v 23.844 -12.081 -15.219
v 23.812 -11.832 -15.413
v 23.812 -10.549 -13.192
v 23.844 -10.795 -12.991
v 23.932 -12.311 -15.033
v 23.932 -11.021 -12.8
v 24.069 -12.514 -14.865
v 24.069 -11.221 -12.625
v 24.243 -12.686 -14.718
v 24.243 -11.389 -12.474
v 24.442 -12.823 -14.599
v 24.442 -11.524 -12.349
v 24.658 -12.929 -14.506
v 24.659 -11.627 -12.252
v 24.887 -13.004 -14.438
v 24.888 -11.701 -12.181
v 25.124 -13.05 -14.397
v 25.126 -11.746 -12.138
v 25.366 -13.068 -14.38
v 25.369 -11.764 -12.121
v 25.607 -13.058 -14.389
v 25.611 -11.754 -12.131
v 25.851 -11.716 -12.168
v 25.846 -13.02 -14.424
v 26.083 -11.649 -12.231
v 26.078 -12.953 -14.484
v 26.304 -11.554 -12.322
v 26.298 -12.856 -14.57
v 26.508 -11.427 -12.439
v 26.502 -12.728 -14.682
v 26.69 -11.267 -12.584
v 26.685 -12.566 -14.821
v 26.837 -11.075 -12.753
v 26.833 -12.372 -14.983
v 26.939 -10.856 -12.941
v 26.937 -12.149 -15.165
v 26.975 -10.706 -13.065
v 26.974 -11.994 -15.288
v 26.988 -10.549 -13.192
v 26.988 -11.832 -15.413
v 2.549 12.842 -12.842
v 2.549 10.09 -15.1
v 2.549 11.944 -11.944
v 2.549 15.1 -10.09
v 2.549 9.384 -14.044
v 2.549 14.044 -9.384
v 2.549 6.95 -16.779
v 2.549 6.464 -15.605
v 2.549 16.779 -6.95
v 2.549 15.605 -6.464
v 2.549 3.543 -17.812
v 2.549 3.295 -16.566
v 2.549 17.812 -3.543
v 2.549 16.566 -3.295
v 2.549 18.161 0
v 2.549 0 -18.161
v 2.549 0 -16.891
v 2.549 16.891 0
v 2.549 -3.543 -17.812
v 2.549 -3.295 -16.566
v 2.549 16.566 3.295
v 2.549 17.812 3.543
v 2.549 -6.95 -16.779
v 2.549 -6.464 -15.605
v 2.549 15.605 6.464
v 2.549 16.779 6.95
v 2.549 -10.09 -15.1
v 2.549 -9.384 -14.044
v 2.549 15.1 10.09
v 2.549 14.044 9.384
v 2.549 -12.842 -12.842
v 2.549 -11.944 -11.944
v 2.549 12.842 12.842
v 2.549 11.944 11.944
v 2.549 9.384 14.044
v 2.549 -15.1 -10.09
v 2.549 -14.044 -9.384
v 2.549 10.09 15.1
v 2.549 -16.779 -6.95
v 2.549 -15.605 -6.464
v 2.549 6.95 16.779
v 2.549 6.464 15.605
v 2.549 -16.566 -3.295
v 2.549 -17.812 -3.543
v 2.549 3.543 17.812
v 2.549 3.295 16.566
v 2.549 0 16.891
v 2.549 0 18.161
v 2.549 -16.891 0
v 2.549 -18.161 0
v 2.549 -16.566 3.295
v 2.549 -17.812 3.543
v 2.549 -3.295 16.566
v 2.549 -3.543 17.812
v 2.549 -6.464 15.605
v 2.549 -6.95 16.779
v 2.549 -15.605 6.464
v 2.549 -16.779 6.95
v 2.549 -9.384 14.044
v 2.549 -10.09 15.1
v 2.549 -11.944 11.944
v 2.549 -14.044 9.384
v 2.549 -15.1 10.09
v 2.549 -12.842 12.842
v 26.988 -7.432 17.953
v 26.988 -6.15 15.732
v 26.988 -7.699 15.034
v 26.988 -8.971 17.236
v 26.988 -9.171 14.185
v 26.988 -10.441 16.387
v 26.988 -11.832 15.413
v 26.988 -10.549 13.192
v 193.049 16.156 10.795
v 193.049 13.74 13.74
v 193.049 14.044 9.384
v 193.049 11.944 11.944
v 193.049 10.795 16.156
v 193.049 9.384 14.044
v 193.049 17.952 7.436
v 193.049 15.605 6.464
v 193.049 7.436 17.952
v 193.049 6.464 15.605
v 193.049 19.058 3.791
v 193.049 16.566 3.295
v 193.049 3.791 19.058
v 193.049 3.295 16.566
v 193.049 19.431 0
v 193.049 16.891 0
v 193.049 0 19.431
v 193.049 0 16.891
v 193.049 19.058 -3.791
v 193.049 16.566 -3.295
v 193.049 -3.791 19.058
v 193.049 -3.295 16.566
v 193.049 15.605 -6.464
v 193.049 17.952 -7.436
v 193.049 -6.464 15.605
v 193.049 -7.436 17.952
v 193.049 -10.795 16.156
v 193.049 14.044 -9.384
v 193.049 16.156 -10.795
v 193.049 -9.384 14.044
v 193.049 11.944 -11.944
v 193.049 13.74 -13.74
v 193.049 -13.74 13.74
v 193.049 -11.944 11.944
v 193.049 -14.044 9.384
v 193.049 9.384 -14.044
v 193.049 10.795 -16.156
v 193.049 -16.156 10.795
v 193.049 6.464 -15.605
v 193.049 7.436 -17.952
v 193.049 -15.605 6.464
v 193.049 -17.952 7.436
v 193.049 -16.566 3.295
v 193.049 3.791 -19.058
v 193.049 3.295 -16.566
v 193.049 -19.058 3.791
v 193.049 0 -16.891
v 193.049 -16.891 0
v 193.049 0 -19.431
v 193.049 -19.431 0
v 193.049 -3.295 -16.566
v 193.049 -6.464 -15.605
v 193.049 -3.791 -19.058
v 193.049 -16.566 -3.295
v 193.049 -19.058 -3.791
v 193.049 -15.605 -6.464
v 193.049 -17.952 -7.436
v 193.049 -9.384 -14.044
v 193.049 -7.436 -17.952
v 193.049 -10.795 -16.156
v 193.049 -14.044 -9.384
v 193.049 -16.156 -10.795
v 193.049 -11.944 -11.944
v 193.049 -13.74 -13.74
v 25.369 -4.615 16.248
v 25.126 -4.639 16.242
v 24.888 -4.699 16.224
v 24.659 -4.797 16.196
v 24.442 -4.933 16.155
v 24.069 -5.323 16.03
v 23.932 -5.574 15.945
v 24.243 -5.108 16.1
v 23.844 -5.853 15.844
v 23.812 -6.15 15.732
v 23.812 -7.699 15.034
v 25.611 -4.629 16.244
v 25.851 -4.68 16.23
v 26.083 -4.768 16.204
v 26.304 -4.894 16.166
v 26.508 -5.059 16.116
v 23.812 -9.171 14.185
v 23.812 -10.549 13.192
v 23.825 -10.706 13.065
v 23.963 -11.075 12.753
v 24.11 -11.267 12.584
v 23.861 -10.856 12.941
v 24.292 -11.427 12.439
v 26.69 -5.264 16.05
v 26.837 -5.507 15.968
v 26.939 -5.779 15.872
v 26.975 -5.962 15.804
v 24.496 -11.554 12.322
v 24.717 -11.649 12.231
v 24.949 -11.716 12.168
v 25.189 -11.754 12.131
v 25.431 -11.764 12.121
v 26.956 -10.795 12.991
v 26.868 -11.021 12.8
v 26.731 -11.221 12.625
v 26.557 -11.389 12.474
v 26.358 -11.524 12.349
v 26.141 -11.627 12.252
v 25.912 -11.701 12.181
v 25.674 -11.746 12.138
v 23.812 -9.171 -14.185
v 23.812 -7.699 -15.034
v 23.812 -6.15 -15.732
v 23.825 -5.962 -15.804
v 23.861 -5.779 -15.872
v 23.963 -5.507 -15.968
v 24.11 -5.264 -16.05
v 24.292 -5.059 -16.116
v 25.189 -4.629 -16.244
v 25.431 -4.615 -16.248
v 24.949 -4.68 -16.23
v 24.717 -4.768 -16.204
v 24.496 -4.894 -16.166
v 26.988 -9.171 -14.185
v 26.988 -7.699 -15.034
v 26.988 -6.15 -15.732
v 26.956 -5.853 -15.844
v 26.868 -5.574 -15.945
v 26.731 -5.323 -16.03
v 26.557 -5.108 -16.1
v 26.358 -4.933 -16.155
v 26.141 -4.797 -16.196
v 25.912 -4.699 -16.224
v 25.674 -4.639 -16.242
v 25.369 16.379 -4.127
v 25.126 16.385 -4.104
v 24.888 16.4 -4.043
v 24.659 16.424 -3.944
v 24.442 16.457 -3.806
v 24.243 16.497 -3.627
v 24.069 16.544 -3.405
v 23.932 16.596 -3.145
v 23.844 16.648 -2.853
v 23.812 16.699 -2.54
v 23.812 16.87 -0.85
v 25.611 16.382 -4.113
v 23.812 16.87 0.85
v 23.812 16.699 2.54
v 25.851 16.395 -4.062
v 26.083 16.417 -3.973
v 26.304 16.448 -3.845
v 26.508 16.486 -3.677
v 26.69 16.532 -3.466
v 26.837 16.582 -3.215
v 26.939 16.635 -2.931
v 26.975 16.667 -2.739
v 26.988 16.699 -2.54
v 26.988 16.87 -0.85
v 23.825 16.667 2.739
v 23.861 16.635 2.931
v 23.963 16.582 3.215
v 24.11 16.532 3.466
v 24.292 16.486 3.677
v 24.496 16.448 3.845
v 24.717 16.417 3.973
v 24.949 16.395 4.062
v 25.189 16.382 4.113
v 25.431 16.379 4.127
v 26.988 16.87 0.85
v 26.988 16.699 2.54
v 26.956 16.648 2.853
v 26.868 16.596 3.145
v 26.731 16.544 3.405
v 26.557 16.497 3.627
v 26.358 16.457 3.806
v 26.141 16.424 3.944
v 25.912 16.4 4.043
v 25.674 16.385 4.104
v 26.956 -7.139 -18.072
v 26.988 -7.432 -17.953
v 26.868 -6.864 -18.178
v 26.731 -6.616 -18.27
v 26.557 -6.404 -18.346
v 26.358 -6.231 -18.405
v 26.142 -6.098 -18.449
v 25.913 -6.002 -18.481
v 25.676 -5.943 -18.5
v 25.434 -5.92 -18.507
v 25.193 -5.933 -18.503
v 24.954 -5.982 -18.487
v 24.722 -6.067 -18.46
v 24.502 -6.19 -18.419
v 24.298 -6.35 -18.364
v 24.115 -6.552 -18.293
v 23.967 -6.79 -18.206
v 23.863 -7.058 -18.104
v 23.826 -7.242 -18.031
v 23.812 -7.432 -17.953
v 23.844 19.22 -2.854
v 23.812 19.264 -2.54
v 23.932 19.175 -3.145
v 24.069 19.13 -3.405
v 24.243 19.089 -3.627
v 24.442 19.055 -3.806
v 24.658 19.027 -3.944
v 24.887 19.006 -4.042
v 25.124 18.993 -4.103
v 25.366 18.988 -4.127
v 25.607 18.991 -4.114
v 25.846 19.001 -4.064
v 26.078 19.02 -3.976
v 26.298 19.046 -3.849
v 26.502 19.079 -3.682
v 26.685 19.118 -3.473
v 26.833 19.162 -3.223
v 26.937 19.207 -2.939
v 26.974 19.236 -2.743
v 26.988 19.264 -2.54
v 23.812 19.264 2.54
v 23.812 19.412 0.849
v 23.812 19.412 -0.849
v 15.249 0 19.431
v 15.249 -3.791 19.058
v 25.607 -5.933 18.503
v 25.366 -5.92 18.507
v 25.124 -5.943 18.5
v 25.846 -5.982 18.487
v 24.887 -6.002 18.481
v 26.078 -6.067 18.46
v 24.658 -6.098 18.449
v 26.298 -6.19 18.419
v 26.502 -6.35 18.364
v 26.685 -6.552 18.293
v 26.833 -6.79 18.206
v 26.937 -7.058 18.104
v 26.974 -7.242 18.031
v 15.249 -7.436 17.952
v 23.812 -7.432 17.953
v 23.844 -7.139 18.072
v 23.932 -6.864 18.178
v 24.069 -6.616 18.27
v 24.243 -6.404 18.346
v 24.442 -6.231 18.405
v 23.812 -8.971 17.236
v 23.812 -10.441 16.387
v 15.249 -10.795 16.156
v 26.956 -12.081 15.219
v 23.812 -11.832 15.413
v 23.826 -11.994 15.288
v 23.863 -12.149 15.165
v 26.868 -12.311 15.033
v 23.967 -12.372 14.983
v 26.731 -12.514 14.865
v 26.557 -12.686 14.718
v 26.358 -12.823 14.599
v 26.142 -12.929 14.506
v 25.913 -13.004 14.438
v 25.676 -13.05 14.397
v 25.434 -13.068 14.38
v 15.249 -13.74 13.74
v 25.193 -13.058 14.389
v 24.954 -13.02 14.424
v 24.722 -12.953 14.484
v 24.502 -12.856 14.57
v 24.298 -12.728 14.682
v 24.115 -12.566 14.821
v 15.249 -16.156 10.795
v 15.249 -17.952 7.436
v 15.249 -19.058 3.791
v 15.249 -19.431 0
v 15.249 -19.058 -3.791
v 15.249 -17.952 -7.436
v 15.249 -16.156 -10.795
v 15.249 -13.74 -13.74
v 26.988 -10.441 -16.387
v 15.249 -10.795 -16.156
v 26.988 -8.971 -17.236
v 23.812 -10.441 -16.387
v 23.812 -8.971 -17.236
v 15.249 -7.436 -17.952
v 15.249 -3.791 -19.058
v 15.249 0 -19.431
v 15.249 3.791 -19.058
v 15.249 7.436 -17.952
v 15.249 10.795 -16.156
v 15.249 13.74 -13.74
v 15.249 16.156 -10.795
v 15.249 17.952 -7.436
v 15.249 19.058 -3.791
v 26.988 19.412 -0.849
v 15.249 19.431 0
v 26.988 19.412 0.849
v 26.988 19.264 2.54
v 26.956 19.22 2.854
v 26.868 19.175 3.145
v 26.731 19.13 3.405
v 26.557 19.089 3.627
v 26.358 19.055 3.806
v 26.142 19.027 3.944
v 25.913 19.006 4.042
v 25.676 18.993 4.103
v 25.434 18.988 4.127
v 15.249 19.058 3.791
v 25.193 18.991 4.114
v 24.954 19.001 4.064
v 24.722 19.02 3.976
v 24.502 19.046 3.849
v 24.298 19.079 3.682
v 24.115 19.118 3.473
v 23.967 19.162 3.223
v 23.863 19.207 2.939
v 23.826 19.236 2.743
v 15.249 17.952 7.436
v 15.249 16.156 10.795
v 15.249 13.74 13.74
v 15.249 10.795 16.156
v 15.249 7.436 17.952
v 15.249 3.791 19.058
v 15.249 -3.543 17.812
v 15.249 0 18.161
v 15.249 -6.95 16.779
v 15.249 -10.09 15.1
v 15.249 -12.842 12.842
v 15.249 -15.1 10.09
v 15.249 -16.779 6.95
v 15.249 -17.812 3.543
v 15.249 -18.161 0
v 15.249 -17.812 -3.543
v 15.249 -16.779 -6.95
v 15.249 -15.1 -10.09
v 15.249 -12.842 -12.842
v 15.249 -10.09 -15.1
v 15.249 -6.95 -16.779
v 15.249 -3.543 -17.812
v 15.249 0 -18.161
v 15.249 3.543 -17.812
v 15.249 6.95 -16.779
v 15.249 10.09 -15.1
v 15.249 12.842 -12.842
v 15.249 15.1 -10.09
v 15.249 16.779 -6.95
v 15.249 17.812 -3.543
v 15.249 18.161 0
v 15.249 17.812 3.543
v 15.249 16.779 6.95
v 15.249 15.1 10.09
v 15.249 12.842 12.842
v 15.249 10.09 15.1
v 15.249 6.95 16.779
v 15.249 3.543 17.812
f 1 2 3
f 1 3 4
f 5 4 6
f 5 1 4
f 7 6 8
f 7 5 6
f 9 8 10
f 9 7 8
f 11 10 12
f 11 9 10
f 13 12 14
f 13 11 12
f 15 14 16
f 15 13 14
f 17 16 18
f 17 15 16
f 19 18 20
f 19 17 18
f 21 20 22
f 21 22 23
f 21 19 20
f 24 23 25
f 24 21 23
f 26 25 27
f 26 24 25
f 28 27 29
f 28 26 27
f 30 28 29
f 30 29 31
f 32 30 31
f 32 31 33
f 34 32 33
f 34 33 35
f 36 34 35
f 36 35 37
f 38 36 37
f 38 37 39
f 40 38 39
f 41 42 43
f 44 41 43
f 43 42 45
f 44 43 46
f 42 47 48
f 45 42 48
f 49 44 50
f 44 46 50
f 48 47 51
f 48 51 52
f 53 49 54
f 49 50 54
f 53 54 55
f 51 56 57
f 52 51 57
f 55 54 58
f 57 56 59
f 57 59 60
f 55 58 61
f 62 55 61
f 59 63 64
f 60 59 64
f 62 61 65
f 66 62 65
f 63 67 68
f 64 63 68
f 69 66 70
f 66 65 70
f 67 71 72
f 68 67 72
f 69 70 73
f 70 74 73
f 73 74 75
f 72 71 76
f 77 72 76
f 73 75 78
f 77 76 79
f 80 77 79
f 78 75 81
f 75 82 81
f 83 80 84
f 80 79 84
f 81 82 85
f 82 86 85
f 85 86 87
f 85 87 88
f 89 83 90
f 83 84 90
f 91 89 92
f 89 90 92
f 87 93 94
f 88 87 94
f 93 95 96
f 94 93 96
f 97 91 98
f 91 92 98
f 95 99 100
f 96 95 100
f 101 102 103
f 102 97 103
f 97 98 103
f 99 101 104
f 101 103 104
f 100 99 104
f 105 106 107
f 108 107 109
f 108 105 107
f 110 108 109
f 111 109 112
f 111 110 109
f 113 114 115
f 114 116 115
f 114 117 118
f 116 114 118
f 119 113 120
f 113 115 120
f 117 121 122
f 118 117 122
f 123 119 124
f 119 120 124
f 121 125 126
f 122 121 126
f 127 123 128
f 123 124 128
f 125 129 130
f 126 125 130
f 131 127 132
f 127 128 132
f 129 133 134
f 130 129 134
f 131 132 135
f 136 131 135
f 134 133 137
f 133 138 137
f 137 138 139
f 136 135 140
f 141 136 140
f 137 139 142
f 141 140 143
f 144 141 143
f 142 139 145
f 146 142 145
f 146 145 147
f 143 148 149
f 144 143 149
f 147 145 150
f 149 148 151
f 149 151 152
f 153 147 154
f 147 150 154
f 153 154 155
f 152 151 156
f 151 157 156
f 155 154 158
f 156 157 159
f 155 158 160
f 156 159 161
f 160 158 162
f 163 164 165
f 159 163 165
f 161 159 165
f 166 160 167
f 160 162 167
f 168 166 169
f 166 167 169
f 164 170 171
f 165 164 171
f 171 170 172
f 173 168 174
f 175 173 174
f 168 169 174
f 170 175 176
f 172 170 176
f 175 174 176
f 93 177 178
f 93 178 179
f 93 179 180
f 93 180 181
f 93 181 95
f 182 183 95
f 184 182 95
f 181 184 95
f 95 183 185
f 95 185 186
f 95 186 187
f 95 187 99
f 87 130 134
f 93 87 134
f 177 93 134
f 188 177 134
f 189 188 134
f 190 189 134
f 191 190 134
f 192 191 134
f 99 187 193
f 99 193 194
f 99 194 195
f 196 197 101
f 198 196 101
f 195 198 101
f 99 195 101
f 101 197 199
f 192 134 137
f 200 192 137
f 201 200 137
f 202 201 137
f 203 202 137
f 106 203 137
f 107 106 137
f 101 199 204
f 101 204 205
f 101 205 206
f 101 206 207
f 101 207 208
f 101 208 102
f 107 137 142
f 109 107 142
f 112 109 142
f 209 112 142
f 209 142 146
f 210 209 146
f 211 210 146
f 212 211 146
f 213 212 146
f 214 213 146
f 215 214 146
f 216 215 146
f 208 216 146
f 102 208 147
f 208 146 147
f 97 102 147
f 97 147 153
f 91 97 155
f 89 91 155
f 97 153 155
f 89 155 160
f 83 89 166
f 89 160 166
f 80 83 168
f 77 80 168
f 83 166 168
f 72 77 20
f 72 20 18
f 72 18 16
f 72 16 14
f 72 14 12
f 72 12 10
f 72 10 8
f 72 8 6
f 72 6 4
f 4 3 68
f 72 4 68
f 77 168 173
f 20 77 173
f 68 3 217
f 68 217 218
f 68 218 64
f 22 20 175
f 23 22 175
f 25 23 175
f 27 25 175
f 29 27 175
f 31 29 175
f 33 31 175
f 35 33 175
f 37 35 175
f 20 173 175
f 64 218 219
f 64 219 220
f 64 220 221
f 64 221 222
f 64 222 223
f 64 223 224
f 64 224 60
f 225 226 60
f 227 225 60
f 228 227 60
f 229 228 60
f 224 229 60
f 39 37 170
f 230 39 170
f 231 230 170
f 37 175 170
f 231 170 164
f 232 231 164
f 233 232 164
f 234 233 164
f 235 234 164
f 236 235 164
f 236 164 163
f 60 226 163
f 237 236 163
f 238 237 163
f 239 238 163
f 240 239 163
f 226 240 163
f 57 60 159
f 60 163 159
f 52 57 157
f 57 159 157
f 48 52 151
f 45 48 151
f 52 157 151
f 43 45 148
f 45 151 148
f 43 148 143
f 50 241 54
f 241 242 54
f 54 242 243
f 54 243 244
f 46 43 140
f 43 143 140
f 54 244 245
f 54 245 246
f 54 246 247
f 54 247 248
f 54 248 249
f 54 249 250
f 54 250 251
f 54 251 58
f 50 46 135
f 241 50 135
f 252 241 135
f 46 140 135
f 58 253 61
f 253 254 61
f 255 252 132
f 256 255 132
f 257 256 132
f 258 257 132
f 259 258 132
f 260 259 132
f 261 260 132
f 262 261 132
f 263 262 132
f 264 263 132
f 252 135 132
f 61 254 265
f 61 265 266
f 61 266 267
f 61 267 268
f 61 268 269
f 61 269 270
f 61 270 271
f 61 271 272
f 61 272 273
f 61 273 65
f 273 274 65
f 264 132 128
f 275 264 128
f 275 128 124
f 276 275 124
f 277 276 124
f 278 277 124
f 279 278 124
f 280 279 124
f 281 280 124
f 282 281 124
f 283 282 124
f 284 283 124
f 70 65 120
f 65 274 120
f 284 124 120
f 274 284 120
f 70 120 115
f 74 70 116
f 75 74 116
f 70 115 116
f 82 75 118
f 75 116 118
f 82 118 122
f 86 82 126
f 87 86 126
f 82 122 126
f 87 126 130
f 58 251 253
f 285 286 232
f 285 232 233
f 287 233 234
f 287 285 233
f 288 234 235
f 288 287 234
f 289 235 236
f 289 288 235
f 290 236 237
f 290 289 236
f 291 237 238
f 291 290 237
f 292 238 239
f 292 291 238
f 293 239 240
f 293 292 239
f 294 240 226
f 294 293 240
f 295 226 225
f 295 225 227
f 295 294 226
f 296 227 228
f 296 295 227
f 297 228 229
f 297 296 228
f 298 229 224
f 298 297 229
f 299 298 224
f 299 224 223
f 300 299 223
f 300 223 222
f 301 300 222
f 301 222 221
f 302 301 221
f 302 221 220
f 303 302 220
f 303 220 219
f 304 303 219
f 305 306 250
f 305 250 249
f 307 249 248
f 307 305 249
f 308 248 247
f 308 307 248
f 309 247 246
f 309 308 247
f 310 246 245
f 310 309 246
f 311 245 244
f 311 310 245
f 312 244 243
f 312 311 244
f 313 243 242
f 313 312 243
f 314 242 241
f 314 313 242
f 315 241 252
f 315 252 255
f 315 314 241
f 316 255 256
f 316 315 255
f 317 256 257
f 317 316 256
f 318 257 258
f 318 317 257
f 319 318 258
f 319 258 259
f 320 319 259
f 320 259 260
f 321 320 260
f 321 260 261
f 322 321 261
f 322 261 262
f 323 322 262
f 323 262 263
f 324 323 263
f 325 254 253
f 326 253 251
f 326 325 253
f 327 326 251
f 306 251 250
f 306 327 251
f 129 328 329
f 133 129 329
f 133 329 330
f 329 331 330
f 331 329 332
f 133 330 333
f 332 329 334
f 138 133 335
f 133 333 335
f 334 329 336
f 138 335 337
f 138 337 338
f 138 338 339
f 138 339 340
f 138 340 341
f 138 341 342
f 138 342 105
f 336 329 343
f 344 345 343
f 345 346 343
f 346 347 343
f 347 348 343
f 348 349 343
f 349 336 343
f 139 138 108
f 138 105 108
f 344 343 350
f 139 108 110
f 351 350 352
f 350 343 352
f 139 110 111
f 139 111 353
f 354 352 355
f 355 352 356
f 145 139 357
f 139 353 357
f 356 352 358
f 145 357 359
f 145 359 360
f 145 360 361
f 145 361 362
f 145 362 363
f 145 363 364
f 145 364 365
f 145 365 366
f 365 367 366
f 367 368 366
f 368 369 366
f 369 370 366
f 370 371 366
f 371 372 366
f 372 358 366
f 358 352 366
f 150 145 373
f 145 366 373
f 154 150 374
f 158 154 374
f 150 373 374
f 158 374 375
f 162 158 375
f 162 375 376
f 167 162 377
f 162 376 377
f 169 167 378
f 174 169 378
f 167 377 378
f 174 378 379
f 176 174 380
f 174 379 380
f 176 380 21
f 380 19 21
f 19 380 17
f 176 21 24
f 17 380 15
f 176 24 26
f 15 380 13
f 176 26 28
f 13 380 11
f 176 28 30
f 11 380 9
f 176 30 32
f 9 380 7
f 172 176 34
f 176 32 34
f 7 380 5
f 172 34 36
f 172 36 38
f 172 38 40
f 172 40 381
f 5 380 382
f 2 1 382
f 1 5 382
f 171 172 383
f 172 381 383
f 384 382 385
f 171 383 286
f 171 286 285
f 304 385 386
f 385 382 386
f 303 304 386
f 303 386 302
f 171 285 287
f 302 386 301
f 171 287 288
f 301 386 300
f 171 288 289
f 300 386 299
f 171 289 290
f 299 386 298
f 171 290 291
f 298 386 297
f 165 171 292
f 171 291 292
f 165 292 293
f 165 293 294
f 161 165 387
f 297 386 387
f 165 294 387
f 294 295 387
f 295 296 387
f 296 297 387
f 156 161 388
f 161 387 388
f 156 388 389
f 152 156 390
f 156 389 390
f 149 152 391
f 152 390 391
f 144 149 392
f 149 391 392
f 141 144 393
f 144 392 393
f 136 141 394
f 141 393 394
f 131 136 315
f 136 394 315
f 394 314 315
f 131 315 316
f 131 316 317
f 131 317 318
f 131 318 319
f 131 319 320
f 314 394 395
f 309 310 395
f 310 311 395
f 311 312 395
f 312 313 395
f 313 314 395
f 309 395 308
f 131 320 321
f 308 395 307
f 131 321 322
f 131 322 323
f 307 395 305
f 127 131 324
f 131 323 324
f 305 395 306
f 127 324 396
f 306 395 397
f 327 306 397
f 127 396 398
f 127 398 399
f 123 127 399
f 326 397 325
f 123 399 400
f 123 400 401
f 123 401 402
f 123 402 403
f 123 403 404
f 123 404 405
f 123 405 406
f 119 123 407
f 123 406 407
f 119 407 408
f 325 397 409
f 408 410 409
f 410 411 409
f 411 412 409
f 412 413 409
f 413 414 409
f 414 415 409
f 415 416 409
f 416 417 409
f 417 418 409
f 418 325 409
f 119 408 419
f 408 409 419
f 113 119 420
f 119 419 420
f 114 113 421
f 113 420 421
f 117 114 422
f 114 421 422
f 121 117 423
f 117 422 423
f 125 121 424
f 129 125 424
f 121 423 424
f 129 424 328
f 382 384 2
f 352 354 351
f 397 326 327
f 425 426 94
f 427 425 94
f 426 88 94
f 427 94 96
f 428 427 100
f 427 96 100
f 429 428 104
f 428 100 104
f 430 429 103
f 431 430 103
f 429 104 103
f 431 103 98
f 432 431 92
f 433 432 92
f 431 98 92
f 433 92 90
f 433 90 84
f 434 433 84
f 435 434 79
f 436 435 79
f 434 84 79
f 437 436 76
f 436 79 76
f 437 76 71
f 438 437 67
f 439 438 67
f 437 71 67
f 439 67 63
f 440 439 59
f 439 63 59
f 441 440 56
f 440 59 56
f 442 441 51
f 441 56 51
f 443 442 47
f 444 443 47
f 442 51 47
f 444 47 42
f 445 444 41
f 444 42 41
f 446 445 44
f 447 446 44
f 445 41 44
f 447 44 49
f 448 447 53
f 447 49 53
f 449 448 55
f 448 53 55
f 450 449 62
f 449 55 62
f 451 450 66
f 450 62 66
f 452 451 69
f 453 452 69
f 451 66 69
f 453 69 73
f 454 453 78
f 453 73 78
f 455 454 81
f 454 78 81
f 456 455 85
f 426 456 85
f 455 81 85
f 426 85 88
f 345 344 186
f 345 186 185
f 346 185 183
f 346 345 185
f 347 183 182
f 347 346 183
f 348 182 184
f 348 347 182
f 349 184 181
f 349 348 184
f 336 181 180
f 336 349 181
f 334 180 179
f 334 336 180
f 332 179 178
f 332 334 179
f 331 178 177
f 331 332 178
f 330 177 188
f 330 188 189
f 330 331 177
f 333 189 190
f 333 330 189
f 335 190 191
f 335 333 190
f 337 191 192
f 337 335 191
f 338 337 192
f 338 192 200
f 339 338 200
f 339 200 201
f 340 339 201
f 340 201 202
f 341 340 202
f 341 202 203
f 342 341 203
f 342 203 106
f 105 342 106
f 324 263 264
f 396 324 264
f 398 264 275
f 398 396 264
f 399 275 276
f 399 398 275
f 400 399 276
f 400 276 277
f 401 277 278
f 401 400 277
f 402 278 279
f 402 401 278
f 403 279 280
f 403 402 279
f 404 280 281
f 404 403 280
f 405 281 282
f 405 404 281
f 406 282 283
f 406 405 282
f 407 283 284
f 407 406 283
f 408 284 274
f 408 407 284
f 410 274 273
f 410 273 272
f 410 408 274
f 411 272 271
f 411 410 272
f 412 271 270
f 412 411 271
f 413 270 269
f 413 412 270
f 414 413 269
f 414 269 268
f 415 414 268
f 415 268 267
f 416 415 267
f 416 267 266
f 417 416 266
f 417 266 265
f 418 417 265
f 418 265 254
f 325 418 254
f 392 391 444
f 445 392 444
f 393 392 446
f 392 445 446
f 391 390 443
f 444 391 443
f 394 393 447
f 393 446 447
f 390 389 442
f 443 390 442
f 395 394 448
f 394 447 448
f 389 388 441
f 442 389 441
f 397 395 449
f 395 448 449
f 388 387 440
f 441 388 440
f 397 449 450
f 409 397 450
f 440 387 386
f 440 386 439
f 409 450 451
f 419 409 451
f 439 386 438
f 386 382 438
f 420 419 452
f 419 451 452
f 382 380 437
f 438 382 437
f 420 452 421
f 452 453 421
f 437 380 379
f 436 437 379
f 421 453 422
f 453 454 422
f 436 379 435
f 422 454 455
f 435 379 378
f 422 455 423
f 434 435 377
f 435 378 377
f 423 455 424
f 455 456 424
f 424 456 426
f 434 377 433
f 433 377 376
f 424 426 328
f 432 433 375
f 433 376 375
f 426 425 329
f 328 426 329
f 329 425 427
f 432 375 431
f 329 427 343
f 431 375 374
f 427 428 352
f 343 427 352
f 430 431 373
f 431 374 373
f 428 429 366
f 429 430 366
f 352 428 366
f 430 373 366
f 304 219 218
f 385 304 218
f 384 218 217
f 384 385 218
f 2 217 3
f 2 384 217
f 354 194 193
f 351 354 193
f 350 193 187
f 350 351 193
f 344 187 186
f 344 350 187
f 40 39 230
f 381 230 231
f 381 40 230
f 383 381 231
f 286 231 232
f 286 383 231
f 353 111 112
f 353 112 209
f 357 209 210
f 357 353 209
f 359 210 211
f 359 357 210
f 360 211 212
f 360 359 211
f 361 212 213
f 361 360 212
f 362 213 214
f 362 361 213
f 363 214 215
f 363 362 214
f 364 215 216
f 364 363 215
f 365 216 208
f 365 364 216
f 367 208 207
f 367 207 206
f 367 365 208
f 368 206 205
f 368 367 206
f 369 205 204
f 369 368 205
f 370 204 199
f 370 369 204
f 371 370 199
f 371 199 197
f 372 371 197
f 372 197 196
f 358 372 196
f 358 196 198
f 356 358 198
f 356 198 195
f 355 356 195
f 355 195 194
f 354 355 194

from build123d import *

# Parameters (mm, degrees)
CUT_EXTRUDE1_DEPTH = 7.62
CIRPATTERN1_COUNT  = 3


with BuildPart() as part:
    # Sketch1 → Revolve1 (revolve)
    with BuildSketch(Plane.XY, mode=Mode.PRIVATE) as revolve1_sk:
        Polygon((15.248535153, 18.161), (2.548535153, 18.161), (2.548535153, 16.891), (193.048535153, 16.891), (193.048535153, 19.431), (15.248535153, 19.431), align=None)
    revolve(revolve1_sk.sketch.rotate(Axis((0, 0, 0), (1, 0, 0)), 90), axis=Axis((0, 0, 0), (1, 0, 0)))

    # Sketch2 → Cut-Extrude1 (cut)
    with BuildSketch(Plane(origin=(0, 19.431, 0), x_dir=(1, 0, 0), z_dir=(0, 1, 0))):
        with BuildLine():
            Line((26.9875, 2.54), (26.9875, -2.54))
            ThreePointArc((26.9875, -2.54), (25.4, -4.1275), (23.8125, -2.54))
            Line((23.8125, -2.54), (23.8125, 2.54))
            ThreePointArc((23.8125, 2.54), (25.4, 4.1275), (26.9875, 2.54))
        make_face()
    cut_extrude1 = extrude(amount=-CUT_EXTRUDE1_DEPTH, mode=Mode.SUBTRACT)

    # CirPattern1: Cut-Extrude1 ×3 about axis
    cirpattern1_axis = Axis((0, 0, 0), (-1, 0, 0))
    for i in range(1, CIRPATTERN1_COUNT):
        add(cut_extrude1.rotate(cirpattern1_axis, i * 360 / CIRPATTERN1_COUNT), mode=Mode.SUBTRACT)


solid = part.part
